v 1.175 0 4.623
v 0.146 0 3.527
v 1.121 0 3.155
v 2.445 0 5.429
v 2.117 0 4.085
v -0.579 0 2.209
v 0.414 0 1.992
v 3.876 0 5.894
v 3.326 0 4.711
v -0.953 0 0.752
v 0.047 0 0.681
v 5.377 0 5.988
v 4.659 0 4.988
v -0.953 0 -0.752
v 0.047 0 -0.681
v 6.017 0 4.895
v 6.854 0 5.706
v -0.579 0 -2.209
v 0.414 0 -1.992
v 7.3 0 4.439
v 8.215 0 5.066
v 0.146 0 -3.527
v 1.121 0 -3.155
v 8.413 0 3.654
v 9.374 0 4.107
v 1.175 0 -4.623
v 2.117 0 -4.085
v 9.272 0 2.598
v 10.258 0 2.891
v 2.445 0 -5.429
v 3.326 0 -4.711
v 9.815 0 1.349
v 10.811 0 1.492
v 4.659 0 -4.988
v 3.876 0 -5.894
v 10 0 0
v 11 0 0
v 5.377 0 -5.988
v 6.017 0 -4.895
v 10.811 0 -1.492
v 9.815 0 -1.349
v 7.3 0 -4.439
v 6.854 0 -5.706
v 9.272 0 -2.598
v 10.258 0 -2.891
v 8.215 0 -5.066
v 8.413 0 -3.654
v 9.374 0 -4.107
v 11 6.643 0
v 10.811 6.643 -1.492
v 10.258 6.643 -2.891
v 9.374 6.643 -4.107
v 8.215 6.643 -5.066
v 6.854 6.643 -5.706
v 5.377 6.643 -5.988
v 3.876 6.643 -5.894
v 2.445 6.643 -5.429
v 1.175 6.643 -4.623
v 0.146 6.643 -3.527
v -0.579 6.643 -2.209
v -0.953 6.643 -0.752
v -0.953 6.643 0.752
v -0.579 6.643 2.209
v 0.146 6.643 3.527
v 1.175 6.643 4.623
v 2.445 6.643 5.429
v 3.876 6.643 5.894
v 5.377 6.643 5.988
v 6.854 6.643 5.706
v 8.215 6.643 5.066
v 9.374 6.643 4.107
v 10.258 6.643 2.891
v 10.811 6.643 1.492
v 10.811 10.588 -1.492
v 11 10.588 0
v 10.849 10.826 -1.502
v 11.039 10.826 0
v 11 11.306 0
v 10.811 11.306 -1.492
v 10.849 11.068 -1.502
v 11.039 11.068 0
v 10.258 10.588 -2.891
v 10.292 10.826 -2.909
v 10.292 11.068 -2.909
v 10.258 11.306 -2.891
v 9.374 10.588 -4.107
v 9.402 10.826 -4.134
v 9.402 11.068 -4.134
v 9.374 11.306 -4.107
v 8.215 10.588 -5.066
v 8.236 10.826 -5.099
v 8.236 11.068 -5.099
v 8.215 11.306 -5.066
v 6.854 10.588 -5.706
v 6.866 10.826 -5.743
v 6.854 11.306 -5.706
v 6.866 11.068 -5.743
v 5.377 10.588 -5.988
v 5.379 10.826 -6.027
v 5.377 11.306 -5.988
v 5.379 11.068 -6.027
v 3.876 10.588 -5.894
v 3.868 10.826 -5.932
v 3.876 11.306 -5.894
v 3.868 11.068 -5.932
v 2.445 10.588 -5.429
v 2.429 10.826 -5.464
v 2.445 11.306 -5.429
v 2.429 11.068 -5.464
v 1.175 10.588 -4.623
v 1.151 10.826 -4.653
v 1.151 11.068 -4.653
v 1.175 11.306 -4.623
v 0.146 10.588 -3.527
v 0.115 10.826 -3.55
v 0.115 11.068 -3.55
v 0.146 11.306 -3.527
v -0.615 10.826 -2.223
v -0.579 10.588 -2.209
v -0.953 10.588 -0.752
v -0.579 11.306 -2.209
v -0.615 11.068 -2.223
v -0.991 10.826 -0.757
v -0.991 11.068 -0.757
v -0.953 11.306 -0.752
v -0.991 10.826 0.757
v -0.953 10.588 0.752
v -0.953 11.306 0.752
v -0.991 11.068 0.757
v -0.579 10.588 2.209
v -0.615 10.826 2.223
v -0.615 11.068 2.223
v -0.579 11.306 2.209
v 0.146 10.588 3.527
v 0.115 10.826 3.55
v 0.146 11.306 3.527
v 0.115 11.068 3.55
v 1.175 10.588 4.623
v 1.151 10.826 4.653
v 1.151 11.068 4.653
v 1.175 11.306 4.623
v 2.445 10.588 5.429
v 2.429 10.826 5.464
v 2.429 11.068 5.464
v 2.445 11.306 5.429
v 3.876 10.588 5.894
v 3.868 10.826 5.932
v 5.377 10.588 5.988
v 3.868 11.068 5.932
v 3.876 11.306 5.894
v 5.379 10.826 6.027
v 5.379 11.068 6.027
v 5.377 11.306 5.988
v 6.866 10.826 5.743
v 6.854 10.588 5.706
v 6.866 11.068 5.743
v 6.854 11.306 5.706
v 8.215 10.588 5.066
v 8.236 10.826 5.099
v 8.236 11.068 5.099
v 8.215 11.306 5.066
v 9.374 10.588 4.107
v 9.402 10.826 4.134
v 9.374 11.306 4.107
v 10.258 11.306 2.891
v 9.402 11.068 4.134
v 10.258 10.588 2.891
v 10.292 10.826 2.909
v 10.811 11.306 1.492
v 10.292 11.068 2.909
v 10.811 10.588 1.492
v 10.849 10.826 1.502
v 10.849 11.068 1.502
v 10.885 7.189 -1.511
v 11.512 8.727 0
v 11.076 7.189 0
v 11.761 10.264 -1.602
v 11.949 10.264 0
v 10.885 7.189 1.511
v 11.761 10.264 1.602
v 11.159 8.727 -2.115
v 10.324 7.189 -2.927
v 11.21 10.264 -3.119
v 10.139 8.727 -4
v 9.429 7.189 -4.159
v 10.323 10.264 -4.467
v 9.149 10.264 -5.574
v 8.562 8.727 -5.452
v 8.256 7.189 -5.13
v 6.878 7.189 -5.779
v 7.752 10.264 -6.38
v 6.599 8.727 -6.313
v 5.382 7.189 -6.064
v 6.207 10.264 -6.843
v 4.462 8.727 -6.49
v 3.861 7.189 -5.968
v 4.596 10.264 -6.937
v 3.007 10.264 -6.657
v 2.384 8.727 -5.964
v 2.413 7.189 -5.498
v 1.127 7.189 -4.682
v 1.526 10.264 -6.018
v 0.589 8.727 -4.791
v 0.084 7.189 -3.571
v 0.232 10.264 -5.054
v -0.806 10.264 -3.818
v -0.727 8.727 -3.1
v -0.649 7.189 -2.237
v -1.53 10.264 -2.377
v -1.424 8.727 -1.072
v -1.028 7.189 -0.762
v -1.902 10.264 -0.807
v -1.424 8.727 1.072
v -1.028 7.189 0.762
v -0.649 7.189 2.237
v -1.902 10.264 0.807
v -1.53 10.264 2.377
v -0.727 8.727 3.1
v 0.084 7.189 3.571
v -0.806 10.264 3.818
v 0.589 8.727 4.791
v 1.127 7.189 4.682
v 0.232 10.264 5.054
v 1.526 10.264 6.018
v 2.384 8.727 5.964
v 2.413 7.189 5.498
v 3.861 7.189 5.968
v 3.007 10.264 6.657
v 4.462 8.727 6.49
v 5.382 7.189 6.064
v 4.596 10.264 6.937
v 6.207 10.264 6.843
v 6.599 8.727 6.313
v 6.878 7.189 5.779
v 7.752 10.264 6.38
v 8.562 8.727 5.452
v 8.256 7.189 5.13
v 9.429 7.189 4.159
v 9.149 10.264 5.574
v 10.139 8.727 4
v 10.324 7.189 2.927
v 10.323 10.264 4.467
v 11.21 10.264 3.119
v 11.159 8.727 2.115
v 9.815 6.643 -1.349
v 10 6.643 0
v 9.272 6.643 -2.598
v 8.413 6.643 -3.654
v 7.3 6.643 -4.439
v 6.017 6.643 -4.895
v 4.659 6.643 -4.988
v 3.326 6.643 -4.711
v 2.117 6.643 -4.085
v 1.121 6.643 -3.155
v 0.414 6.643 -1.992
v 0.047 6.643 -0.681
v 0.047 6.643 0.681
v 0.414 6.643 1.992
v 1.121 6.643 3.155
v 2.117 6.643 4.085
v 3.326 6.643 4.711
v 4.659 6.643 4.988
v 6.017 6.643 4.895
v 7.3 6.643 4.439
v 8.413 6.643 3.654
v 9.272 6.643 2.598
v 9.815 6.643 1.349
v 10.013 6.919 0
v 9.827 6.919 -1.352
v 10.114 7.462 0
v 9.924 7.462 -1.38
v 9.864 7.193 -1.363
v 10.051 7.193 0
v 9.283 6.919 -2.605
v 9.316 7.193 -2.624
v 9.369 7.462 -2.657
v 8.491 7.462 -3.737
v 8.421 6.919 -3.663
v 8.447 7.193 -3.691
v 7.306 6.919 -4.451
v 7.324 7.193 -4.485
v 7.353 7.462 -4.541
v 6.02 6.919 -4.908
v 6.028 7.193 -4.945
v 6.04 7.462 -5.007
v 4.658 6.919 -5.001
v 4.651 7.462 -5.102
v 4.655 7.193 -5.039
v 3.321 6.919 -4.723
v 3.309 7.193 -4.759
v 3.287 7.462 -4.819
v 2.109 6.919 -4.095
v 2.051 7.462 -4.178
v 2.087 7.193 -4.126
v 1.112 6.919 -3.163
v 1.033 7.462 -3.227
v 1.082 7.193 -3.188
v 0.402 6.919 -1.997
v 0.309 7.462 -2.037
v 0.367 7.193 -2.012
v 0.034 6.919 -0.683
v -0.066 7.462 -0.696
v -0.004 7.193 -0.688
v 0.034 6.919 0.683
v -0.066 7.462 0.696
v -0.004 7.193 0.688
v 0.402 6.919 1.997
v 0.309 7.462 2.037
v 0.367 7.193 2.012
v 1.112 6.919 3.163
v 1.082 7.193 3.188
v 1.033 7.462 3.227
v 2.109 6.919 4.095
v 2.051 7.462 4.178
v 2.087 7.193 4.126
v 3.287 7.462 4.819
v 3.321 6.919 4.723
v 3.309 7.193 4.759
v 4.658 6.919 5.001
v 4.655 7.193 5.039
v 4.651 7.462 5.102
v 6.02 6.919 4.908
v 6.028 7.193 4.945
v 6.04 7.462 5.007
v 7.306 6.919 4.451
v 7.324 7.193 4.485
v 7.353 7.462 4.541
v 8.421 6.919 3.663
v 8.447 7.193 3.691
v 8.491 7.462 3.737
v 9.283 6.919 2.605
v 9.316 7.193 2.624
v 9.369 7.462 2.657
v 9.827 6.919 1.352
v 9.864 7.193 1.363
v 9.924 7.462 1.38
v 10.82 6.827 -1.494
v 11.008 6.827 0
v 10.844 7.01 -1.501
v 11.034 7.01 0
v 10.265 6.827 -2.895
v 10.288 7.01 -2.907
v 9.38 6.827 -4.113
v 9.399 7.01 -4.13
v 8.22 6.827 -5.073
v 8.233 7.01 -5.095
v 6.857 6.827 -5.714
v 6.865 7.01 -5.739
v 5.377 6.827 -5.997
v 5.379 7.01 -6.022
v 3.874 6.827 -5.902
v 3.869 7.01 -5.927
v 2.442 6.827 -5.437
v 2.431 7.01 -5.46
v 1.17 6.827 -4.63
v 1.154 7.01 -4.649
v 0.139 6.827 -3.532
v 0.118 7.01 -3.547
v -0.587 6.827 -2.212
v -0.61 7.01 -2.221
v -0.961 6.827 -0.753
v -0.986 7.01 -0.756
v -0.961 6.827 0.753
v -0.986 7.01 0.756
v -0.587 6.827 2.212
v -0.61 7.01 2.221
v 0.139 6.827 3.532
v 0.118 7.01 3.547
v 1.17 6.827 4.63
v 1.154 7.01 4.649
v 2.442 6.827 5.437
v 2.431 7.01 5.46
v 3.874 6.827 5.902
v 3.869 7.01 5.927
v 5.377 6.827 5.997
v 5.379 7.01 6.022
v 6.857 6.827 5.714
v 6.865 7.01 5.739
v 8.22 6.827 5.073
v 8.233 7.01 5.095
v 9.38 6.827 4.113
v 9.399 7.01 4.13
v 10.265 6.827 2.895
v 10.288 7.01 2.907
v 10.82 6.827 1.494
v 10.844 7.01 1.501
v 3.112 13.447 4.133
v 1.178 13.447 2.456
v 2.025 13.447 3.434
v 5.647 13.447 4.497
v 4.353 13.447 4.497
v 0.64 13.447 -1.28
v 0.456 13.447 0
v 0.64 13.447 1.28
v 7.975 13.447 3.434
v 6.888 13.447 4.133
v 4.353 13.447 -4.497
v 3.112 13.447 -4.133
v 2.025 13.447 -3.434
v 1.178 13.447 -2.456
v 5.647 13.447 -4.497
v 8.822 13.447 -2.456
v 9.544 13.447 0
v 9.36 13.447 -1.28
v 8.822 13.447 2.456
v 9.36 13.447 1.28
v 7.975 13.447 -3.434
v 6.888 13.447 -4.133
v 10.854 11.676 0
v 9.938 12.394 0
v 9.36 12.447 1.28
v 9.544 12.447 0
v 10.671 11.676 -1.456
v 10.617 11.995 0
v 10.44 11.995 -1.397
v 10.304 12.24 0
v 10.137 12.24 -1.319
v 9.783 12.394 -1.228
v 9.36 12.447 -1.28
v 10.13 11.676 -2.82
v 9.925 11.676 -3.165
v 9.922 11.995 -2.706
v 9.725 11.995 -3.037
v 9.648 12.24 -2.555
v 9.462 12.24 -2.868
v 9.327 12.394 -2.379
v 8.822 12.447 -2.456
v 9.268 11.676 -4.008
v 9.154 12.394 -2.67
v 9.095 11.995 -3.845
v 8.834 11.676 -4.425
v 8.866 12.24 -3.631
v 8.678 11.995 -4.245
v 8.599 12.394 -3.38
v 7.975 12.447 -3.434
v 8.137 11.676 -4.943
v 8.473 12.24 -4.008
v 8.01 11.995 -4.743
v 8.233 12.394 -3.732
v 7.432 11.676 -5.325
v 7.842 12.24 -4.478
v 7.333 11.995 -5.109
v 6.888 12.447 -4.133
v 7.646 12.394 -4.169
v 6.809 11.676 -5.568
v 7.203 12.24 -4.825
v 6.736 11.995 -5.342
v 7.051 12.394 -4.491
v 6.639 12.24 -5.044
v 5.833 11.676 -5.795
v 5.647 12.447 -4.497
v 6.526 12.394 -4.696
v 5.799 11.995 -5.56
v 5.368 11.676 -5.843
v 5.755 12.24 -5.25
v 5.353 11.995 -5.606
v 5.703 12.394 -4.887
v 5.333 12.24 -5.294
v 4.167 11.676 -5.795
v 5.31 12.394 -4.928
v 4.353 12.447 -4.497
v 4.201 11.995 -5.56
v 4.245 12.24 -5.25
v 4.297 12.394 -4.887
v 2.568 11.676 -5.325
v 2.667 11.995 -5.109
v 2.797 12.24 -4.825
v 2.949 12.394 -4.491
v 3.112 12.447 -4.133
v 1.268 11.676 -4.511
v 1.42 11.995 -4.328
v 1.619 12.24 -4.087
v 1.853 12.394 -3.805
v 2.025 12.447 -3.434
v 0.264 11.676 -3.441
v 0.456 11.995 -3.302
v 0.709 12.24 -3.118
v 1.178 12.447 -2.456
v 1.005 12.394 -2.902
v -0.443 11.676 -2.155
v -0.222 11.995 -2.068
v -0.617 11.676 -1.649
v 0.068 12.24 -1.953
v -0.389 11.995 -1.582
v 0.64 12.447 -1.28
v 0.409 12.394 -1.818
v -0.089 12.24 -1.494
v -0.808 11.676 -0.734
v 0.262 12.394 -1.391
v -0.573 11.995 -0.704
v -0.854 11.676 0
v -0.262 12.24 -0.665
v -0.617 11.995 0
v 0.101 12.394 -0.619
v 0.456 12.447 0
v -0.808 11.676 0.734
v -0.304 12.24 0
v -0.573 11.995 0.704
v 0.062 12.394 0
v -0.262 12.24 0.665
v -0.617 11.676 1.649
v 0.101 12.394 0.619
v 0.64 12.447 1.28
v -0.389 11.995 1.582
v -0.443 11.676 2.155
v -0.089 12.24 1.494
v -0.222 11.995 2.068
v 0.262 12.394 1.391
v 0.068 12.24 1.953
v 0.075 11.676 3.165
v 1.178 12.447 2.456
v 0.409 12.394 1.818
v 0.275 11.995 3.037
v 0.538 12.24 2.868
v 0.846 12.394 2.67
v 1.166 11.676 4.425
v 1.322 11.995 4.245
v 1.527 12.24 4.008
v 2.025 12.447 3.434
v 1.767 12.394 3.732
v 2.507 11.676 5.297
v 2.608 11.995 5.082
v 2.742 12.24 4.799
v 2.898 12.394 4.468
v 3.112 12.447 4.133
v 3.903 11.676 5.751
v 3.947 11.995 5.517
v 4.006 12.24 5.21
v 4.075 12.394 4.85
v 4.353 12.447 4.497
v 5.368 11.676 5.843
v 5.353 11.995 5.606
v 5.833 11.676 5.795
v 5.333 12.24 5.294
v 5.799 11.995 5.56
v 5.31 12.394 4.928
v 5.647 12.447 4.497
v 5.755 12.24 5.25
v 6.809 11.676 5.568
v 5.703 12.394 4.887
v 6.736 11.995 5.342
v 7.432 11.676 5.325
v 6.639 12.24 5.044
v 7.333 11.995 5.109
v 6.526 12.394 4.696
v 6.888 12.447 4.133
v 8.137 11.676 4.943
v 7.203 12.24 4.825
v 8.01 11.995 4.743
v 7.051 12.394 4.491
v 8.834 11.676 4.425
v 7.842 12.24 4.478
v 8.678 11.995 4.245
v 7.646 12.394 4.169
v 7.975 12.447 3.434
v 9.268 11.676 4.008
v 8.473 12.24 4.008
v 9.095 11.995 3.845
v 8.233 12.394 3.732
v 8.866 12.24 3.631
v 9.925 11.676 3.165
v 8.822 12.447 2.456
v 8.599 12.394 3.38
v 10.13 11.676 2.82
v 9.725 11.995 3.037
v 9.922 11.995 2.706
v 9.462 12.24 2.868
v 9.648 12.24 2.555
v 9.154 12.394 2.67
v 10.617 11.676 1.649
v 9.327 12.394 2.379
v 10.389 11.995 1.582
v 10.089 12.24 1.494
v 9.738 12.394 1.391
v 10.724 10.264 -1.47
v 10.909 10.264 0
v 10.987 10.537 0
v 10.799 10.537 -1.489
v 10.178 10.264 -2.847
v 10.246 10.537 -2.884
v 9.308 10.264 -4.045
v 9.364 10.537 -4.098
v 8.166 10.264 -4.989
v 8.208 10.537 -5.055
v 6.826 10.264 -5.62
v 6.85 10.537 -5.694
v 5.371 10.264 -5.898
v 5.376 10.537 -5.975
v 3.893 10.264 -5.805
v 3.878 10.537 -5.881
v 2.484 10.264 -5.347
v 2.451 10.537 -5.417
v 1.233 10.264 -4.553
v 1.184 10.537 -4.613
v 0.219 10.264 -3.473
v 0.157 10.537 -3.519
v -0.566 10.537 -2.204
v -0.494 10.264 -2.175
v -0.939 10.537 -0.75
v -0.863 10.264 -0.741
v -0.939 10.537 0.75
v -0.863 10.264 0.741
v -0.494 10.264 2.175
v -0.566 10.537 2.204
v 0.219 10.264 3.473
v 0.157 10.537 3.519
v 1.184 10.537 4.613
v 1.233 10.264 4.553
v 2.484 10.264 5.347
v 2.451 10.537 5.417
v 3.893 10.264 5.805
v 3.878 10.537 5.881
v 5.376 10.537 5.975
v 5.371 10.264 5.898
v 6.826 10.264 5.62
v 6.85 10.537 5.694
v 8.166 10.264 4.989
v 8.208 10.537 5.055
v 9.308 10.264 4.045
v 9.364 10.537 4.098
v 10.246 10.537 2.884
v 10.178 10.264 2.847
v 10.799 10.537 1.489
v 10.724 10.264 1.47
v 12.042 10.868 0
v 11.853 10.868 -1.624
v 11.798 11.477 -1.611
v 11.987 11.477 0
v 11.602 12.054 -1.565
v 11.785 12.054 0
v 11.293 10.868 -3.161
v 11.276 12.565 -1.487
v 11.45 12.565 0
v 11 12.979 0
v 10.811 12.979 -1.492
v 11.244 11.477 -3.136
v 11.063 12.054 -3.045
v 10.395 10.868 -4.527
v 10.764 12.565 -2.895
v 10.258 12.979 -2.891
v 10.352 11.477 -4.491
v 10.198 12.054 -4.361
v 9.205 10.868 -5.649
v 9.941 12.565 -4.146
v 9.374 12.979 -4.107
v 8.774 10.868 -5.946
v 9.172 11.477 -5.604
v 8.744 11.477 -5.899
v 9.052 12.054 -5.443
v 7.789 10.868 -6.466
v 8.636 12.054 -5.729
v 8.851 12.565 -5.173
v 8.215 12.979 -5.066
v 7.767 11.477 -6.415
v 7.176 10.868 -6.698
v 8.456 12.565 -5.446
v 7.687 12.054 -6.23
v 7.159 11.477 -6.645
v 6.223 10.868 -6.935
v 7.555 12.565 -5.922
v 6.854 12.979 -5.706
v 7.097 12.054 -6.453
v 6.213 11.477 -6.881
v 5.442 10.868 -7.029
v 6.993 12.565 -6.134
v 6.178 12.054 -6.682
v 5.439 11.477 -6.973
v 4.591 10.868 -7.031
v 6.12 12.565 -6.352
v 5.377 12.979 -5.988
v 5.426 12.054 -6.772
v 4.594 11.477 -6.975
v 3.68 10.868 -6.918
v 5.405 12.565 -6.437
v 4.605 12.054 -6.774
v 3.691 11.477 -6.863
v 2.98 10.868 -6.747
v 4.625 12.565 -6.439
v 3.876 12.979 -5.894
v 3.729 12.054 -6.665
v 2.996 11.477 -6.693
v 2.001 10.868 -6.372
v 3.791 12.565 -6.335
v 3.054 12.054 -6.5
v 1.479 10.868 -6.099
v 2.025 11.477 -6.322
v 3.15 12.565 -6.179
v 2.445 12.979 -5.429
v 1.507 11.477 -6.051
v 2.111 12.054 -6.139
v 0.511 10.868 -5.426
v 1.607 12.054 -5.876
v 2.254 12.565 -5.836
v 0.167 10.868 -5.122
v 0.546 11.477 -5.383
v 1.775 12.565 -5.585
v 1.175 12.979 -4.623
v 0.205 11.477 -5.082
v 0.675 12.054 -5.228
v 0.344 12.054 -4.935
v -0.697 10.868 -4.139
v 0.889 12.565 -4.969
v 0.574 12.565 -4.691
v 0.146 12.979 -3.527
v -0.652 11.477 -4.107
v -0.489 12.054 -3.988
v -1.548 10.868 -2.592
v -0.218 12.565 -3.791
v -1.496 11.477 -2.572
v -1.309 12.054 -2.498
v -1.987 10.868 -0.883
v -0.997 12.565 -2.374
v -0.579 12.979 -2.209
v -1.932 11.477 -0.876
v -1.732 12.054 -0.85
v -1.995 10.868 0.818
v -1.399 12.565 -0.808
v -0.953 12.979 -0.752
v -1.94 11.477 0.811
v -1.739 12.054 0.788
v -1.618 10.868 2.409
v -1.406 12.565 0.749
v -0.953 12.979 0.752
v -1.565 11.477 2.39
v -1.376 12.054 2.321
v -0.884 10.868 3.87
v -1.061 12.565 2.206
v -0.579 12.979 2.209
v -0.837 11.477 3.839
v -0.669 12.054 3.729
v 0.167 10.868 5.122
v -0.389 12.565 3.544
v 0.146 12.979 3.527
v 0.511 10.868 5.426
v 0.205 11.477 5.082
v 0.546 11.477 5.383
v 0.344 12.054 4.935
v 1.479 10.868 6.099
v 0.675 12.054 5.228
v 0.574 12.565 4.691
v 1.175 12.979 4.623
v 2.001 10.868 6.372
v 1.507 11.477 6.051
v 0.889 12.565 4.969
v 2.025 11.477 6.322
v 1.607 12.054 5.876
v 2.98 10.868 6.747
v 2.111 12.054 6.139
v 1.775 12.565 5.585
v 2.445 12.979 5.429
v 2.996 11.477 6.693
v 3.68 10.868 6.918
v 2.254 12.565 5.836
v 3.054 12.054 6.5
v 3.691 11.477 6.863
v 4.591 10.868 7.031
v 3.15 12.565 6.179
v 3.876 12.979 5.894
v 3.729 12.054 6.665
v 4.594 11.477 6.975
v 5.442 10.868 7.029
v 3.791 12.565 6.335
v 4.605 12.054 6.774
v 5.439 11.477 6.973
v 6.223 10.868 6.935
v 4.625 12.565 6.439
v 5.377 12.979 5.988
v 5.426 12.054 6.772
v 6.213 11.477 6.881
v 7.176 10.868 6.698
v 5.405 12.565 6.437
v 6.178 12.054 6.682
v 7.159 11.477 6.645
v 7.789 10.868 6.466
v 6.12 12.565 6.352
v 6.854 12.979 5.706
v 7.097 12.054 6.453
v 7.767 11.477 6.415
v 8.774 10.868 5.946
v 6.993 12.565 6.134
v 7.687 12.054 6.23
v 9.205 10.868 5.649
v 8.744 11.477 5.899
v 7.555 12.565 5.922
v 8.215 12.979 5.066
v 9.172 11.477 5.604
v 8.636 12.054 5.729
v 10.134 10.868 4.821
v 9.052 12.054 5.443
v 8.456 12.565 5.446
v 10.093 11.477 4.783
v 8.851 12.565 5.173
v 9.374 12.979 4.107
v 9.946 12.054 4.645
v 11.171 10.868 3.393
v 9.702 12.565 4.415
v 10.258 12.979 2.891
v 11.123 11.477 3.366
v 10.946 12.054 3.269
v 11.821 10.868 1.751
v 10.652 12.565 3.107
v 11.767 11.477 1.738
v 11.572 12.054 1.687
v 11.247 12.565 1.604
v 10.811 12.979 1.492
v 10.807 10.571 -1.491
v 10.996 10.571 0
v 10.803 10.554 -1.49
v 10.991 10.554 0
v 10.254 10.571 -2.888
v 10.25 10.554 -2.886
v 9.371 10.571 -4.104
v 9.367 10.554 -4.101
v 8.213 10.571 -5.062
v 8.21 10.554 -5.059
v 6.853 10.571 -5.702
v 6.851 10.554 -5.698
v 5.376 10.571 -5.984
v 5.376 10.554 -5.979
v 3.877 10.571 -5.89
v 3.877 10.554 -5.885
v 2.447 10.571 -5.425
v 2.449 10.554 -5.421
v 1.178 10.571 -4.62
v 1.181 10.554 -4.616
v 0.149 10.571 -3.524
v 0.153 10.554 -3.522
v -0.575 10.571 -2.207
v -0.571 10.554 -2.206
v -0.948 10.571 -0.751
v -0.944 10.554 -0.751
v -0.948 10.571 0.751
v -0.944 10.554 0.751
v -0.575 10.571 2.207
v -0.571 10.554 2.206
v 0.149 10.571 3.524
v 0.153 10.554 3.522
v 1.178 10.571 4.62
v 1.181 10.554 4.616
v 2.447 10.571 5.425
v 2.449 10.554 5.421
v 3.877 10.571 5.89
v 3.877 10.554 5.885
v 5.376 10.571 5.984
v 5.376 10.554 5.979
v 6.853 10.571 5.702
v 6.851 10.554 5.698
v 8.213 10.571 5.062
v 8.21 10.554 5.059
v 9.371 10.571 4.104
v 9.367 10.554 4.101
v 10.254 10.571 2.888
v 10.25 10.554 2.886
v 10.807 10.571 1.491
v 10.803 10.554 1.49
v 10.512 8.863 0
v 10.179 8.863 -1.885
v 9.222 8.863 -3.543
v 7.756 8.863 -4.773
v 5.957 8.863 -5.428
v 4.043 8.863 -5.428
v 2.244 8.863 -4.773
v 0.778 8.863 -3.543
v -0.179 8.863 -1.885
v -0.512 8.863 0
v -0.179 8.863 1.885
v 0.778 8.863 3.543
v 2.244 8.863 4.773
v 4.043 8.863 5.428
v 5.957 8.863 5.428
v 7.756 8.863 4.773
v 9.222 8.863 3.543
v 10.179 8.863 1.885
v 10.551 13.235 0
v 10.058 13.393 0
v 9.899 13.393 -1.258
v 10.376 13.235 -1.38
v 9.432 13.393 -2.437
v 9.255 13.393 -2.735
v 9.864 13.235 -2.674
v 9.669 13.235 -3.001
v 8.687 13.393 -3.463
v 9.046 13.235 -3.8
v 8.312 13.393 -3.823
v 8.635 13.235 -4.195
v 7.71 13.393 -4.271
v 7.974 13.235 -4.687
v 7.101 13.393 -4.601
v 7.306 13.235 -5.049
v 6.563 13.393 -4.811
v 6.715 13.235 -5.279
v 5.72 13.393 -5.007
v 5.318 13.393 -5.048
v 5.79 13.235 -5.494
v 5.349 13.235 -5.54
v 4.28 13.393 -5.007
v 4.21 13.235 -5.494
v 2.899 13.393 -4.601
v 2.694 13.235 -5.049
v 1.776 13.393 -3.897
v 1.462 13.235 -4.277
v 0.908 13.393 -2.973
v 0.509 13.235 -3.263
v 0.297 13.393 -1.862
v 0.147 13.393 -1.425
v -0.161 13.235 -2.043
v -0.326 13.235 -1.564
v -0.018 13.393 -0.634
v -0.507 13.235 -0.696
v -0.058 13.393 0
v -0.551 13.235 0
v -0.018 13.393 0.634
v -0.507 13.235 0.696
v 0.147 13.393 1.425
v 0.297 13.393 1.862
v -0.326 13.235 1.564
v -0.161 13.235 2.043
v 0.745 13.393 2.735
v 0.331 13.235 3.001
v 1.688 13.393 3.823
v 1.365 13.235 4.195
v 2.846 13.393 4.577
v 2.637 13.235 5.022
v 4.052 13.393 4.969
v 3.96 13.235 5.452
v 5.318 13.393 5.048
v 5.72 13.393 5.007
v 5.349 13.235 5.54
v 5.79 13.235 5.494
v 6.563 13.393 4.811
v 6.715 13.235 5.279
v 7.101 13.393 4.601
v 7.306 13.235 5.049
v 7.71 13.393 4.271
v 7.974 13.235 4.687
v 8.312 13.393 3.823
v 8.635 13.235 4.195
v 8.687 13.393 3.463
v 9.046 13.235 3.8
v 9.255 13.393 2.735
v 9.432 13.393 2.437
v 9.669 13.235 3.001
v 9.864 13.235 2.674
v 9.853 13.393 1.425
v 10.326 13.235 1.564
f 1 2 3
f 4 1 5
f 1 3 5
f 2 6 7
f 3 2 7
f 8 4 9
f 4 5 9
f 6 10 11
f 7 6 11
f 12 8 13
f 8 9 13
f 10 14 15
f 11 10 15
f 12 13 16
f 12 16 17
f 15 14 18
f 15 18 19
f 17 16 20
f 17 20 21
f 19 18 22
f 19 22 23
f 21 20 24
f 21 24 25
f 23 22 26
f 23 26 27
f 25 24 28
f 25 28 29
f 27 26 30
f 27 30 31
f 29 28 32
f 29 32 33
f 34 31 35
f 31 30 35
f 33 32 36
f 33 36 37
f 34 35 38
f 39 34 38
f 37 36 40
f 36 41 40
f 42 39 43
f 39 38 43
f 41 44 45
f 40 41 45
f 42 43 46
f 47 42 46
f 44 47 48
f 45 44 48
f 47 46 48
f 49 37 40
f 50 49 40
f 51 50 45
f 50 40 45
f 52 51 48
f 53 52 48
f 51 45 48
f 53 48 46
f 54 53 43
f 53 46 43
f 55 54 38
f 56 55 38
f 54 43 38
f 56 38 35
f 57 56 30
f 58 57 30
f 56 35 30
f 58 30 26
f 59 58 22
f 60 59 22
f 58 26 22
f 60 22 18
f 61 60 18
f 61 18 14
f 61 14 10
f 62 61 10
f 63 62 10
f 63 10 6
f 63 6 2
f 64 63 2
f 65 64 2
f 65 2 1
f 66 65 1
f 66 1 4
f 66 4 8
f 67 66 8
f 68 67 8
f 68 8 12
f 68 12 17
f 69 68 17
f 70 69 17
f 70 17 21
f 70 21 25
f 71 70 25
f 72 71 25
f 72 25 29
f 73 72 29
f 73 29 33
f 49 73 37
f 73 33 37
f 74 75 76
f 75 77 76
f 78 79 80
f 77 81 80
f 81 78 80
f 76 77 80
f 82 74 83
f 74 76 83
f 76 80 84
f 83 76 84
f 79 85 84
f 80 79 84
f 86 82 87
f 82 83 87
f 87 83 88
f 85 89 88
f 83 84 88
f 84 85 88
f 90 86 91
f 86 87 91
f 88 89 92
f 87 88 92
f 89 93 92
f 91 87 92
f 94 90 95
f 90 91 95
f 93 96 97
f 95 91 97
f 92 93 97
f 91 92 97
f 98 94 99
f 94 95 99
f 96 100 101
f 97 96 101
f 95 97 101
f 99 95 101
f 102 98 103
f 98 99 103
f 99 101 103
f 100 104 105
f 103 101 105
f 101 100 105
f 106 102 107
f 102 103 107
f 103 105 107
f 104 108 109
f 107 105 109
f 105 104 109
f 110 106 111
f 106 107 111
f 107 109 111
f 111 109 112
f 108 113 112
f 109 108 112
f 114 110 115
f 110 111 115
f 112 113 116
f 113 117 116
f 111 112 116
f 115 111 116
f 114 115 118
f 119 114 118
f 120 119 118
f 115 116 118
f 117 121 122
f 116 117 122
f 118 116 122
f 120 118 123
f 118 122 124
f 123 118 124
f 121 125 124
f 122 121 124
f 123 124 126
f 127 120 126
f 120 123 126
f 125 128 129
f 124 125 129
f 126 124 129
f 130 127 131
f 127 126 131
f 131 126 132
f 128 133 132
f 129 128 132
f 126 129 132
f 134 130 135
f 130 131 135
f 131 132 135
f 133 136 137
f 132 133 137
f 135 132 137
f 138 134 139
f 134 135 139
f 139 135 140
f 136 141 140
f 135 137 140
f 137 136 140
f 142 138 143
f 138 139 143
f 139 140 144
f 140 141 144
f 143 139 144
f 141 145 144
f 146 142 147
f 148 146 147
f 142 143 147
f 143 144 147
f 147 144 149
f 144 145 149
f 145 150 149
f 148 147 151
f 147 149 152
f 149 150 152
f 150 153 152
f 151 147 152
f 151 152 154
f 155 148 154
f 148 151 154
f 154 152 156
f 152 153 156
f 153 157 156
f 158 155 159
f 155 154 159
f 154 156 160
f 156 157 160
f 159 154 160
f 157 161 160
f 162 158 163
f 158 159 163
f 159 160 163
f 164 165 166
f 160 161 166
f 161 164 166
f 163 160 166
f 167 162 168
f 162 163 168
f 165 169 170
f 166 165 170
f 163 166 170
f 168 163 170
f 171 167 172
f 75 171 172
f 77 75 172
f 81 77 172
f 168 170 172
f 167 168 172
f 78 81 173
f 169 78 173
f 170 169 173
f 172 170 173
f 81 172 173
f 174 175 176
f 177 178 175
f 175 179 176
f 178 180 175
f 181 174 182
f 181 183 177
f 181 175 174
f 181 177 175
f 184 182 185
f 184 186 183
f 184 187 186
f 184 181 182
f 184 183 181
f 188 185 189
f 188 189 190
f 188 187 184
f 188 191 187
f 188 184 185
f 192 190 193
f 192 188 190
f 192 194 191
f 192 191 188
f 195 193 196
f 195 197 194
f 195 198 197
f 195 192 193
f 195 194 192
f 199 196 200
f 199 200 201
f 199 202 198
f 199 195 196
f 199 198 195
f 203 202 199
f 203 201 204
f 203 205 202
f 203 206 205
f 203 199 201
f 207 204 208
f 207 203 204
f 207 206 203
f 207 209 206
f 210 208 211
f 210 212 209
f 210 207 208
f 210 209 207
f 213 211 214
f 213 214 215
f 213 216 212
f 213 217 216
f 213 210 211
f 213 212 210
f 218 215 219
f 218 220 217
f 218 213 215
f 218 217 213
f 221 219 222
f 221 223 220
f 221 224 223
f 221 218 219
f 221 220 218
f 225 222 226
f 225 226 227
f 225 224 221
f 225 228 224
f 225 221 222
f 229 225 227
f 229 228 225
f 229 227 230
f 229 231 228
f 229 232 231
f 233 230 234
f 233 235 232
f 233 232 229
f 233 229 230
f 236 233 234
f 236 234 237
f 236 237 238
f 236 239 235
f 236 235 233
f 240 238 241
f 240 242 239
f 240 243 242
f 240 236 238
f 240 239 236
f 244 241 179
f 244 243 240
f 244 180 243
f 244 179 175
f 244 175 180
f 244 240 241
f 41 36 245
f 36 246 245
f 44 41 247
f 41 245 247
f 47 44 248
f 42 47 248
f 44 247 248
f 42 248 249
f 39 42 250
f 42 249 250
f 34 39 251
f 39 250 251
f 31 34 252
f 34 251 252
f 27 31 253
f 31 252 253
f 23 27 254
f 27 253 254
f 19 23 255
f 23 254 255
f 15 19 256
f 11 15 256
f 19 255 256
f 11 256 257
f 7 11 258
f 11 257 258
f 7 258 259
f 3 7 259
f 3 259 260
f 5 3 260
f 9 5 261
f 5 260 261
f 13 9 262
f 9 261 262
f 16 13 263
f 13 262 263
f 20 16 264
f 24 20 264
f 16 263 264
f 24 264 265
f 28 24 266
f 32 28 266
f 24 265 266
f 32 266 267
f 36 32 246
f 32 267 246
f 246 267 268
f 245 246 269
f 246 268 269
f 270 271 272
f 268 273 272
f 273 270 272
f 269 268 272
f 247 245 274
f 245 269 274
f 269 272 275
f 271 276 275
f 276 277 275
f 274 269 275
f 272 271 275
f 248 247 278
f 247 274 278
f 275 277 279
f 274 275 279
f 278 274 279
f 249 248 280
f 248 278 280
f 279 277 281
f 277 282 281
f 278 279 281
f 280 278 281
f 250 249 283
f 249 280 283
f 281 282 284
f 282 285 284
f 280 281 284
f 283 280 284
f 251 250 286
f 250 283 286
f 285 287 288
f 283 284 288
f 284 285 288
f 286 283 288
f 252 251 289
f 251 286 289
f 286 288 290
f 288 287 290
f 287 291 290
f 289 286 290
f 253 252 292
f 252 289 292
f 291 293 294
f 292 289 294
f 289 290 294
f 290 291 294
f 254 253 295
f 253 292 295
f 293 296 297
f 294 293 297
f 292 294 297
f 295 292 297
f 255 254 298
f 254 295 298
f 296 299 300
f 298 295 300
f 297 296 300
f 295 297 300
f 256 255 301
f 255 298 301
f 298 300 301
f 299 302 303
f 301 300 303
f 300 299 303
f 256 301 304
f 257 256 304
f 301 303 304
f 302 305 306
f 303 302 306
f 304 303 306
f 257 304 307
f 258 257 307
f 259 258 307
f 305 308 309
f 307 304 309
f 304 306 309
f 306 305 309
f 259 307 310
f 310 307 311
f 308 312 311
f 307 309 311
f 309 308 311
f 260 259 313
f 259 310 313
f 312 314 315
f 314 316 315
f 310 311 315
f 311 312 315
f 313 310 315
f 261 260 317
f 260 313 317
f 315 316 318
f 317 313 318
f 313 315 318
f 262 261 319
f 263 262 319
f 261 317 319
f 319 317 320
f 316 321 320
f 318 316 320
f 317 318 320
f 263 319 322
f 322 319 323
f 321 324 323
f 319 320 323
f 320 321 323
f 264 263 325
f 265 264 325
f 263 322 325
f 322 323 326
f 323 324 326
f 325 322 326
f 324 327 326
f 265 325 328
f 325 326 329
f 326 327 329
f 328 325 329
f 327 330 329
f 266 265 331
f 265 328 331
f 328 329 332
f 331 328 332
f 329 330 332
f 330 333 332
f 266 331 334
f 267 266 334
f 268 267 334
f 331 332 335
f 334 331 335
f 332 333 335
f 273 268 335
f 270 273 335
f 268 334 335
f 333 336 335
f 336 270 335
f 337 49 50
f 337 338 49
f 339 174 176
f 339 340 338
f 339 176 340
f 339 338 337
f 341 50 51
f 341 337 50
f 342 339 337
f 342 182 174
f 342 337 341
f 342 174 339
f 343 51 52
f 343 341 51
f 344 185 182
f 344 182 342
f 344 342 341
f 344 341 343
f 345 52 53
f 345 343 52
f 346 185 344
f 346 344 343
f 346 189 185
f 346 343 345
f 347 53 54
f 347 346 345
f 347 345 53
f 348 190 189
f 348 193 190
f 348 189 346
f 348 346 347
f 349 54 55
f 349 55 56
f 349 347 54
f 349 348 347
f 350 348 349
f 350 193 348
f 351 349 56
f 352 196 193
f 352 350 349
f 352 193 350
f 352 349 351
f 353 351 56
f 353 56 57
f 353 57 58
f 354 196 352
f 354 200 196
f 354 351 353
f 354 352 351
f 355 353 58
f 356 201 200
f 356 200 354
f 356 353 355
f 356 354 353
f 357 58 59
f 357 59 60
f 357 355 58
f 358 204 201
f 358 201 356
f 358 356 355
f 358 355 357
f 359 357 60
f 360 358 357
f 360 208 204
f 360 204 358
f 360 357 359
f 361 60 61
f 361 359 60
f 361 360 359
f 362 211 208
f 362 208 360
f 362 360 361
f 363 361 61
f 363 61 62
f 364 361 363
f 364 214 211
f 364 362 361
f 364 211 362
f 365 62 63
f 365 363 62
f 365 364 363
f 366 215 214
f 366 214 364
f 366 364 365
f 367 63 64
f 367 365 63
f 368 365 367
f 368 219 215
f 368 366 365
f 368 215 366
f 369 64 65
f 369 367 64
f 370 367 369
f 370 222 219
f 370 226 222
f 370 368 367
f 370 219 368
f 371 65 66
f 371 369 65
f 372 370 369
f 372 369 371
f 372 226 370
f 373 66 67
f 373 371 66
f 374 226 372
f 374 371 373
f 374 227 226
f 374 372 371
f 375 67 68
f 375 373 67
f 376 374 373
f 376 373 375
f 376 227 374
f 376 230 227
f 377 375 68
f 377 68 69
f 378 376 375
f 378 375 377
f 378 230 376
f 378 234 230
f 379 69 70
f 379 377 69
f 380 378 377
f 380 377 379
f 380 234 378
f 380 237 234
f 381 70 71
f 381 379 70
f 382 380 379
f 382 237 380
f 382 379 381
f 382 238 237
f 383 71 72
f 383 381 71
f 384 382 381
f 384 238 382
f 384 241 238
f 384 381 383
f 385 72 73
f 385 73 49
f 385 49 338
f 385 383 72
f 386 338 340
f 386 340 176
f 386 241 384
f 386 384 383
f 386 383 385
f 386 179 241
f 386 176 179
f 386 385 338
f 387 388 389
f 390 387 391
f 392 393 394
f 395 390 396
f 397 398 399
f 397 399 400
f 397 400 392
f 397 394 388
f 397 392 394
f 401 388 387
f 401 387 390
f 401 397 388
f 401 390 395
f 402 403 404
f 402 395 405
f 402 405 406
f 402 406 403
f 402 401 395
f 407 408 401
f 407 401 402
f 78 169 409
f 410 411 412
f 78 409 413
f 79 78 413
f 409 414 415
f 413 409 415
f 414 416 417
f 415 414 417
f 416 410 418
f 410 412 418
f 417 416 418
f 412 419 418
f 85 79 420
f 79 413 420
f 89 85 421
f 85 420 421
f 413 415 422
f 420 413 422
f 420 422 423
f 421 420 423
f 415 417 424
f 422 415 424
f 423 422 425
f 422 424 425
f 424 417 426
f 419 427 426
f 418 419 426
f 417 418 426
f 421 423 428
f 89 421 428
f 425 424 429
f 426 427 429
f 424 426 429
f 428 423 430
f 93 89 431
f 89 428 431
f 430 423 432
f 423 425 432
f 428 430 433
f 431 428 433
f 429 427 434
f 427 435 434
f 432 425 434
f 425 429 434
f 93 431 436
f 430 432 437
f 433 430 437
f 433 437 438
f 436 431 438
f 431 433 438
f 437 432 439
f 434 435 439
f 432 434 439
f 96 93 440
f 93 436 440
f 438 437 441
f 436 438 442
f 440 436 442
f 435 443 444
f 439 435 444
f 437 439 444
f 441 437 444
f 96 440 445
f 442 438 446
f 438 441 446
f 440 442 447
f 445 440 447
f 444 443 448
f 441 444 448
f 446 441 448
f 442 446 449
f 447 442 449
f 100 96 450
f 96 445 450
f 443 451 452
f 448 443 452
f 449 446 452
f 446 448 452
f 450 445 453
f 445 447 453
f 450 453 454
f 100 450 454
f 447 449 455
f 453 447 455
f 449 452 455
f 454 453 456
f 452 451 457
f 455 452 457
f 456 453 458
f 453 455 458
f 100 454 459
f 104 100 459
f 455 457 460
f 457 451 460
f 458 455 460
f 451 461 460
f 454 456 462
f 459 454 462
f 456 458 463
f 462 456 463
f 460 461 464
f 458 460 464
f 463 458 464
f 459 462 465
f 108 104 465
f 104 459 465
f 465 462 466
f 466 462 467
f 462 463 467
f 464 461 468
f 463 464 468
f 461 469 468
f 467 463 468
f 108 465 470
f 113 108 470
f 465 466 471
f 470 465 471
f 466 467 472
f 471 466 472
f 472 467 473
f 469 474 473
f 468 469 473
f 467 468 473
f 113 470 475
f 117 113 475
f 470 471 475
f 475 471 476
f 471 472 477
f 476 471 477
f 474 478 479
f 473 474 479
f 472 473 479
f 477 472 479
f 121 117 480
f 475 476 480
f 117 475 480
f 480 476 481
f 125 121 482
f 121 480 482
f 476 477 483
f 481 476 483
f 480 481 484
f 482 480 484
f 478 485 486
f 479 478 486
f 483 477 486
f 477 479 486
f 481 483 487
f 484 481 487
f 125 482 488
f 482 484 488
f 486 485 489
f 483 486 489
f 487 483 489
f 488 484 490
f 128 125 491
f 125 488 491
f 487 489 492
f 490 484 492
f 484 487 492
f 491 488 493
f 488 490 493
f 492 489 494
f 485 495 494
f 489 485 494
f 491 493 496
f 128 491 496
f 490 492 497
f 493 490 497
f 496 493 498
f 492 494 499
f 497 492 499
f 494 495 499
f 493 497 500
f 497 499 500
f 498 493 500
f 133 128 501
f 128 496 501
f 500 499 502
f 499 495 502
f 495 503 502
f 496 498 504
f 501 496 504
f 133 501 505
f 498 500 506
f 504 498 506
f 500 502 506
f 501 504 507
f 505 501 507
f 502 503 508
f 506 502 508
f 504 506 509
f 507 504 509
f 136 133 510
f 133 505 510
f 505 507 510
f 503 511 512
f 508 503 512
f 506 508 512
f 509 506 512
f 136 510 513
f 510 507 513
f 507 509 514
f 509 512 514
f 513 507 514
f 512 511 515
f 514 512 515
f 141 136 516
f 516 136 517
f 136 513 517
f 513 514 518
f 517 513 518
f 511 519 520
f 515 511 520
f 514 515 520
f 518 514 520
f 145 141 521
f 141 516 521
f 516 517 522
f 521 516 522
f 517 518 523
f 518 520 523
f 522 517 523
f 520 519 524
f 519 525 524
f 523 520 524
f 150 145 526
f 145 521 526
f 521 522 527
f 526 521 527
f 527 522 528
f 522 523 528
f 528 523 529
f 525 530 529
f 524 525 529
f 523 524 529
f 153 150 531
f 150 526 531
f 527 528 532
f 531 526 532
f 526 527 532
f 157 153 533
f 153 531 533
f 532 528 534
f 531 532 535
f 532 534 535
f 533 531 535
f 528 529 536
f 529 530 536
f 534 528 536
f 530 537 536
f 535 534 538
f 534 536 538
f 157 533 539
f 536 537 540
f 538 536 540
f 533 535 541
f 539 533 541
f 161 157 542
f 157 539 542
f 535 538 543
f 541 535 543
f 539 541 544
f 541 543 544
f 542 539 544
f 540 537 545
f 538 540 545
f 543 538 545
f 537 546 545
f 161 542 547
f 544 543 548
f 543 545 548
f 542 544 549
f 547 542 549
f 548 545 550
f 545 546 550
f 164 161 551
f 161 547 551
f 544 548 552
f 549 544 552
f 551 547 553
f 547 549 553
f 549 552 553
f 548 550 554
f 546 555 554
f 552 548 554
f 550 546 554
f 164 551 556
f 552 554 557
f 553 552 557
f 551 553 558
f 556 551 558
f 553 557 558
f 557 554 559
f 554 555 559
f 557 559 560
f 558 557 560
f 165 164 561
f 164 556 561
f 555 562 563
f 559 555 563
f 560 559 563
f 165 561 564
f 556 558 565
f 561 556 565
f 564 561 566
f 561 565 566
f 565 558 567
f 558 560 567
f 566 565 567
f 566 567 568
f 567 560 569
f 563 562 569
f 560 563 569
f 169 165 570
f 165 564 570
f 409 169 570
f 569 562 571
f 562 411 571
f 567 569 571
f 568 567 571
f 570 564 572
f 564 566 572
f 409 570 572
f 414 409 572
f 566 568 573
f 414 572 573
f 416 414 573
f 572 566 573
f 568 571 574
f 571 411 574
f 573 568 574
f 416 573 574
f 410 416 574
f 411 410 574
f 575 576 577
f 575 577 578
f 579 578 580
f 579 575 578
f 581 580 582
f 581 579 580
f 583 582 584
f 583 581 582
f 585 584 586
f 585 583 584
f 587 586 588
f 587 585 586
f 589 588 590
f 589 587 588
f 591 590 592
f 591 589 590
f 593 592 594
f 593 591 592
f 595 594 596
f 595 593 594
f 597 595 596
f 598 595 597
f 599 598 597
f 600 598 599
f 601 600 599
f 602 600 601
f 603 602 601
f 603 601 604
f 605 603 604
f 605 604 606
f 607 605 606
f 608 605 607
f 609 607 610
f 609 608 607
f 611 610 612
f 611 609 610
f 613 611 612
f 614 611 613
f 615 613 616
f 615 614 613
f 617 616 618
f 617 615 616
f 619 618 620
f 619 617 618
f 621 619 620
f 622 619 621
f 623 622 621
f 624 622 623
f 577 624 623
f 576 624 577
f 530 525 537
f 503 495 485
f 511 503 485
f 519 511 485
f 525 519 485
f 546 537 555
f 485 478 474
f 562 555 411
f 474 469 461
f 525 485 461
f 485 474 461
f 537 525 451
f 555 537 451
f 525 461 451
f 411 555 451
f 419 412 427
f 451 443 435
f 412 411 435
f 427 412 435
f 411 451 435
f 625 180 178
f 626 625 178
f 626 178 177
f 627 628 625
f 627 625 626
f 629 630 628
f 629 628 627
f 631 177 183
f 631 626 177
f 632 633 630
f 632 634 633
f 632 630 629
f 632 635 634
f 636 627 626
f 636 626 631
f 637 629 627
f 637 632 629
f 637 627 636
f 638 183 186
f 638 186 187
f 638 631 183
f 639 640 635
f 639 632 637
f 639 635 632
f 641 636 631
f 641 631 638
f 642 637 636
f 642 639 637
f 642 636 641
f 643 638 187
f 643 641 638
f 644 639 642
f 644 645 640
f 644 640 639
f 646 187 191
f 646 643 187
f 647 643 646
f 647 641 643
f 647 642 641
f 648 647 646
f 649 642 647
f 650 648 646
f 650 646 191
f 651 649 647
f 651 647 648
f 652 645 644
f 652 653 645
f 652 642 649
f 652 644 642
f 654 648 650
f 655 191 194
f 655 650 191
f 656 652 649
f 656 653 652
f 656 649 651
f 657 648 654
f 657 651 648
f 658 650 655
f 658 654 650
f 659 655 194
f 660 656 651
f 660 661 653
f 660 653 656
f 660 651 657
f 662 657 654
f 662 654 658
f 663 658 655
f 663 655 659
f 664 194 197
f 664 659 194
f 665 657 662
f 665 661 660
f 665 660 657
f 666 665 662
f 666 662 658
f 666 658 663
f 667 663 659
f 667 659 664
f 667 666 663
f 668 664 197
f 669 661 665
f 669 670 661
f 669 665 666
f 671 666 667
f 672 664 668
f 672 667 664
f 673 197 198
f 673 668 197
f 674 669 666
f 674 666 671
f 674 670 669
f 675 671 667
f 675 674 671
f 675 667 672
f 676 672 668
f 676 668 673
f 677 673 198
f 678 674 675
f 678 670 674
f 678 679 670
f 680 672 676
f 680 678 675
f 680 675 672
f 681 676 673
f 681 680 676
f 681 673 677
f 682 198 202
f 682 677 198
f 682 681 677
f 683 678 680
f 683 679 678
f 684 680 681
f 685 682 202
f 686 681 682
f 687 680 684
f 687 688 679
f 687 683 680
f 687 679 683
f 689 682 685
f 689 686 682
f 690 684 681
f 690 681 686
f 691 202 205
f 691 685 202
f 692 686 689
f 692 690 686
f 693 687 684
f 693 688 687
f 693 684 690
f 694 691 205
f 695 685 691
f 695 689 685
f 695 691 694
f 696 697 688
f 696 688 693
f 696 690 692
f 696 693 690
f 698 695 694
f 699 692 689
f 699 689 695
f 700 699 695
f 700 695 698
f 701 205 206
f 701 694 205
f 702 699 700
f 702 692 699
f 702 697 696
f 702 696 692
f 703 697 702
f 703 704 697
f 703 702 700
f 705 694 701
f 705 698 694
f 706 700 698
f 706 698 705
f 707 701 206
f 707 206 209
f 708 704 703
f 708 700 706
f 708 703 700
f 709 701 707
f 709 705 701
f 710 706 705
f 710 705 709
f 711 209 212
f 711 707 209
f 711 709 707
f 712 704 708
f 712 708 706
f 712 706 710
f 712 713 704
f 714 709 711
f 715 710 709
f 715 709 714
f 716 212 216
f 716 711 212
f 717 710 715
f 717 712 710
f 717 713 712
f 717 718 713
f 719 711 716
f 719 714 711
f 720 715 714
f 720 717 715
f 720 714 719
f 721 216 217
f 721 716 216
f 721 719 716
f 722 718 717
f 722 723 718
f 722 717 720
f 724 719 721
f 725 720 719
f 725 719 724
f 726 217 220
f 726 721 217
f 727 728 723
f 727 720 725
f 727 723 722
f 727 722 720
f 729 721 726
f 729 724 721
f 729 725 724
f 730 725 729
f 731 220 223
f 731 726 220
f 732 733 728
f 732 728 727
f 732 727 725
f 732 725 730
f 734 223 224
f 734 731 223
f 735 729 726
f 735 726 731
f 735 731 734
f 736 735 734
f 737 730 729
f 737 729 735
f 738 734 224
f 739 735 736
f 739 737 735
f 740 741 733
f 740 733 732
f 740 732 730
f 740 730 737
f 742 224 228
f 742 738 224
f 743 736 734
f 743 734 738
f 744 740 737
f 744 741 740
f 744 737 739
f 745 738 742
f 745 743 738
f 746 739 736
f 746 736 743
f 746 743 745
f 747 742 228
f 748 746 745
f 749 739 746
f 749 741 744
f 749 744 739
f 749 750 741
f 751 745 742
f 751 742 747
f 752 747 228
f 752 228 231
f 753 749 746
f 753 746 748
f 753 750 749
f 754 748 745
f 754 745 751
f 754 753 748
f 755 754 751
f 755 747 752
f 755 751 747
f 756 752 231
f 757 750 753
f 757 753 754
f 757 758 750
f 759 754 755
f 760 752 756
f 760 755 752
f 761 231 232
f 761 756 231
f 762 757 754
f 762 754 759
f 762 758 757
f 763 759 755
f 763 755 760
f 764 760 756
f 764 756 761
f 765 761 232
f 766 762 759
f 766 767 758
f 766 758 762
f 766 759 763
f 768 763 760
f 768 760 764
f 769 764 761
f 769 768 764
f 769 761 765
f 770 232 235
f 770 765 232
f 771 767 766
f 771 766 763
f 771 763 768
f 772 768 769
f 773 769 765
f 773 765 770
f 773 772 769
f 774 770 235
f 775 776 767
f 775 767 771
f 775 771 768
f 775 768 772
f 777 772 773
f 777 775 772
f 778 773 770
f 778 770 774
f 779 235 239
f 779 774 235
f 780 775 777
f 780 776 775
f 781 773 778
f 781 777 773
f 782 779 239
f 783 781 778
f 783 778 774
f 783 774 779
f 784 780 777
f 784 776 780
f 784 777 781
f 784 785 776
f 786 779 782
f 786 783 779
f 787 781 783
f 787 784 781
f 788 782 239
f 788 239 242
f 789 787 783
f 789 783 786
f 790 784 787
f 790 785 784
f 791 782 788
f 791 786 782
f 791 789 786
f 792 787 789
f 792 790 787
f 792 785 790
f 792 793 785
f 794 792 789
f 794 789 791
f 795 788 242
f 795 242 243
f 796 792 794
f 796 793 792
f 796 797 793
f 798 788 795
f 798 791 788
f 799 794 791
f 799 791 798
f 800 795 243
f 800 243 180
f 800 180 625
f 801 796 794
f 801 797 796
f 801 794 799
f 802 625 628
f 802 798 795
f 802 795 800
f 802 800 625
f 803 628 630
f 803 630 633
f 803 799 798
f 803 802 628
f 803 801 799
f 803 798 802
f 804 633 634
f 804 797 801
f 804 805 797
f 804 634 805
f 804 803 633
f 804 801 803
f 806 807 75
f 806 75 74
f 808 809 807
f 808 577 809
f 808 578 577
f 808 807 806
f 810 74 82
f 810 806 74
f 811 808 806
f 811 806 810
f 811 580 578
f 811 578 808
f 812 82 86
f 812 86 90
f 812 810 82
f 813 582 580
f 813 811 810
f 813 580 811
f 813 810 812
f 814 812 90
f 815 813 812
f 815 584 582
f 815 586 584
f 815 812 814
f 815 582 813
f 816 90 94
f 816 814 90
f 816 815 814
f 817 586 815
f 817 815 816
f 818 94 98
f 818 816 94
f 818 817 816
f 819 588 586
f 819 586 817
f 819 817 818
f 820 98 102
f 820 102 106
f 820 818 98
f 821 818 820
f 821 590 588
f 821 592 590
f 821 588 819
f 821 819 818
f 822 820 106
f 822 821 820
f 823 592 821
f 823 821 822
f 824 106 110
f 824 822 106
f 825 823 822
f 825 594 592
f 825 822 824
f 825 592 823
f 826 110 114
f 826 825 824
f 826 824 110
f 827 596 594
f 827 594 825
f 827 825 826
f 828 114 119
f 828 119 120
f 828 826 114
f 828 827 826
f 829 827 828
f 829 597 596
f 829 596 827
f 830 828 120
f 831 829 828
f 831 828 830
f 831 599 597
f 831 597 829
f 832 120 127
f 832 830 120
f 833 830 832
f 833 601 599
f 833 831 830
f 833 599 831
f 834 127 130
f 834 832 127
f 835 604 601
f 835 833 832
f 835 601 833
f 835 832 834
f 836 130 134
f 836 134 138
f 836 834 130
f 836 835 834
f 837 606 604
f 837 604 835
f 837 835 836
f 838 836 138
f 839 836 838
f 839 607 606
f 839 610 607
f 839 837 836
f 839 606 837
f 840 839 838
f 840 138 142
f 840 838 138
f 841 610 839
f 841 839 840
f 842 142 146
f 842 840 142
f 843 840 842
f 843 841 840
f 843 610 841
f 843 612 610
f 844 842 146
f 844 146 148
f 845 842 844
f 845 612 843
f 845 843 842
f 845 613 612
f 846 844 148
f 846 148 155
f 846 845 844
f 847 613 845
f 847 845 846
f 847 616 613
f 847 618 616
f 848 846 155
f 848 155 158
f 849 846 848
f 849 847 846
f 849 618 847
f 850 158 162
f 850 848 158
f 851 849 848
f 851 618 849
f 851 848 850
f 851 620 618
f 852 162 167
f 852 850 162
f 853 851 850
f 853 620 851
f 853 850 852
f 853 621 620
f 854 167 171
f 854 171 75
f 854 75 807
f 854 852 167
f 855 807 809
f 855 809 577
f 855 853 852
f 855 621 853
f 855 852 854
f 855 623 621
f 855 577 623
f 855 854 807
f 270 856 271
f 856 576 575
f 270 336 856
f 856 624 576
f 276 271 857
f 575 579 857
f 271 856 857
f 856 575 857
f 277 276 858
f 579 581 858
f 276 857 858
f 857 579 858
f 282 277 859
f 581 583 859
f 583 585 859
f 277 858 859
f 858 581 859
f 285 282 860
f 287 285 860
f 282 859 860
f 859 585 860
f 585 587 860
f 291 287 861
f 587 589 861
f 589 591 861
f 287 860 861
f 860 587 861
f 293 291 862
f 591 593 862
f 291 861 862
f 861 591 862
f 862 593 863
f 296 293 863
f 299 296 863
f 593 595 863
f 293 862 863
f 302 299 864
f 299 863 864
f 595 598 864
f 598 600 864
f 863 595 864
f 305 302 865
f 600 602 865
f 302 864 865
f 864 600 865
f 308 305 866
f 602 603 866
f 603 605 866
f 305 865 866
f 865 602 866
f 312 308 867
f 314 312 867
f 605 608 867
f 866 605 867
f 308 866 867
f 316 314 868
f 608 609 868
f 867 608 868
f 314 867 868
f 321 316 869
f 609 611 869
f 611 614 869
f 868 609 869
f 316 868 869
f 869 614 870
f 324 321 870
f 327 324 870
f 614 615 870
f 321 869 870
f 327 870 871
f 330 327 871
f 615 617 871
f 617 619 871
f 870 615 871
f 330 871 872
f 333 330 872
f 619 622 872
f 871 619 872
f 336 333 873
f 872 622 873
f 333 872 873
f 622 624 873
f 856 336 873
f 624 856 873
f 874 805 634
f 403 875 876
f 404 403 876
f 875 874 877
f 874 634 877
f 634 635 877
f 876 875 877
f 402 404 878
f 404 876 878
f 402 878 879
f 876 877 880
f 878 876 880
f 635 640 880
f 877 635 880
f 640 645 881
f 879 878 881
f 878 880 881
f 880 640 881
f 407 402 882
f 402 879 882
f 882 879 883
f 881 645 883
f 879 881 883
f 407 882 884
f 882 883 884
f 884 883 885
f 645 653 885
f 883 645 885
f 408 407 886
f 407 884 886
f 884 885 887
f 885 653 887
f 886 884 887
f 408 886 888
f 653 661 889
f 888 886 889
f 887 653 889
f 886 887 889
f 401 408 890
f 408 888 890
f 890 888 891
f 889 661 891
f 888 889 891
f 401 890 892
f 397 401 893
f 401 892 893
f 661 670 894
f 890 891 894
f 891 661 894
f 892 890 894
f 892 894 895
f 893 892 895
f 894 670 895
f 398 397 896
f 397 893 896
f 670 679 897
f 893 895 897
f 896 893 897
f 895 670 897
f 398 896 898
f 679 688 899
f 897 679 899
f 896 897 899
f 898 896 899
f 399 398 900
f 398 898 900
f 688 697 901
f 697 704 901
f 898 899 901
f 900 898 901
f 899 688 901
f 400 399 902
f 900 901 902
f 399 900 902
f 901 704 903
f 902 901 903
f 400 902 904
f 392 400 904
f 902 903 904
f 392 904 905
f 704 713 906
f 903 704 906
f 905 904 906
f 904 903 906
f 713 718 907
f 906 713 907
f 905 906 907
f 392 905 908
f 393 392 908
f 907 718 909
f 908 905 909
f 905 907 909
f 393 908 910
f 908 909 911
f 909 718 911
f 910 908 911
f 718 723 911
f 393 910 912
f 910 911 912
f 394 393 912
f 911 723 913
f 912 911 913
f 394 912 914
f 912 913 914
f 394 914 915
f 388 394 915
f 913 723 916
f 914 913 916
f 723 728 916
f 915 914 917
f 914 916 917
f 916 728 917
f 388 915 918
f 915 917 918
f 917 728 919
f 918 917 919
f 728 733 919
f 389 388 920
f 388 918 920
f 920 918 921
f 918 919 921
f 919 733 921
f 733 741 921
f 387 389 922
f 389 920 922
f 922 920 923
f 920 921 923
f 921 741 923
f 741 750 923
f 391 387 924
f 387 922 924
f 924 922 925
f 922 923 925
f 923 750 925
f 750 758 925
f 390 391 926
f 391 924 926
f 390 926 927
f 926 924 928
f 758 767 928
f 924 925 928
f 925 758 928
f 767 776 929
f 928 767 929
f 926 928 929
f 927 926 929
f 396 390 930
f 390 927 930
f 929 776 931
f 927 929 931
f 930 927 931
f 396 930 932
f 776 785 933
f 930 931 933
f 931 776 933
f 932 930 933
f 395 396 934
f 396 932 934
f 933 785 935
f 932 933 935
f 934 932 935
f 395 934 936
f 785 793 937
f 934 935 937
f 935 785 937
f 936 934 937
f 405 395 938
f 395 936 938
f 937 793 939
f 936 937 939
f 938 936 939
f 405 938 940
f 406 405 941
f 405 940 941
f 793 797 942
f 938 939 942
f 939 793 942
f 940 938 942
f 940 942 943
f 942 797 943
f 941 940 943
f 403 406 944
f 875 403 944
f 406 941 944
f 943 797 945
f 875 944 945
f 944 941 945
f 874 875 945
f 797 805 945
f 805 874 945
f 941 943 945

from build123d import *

# Parameters (mm, degrees)
CONG_1_R = 1.5
CONG_2_R = 3
COQUE1_T = 1


with BuildPart() as part:
    # Esquisse1 → Révolution1 (revolve)
    with BuildSketch(Plane.XY):
        Polygon((10, 0), (10, 7.060491131), (11.528559936, 12.44684519), (5, 12.44684519), (5, 0), align=None)
    revolve(axis=Axis((5, 0, 0), (0, 1, 0)))

    # Congé1
    cong_1_edges = [part.edges().sort_by_distance(p)[0] for p in [
        (-1.528559936, 12.44684519, 0),
    ]]
    fillet(cong_1_edges, radius=CONG_1_R)

    # Congé2
    cong_2_edges = [part.edges().sort_by_distance(p)[0] for p in [
        (0, 7.060491131, 0),
    ]]
    fillet(cong_2_edges, radius=CONG_2_R)

    # Coque1
    coque1_openings = [part.faces().sort_by_distance(p)[0] for p in [
        (5, 0, 0),
    ]]
    offset(amount=COQUE1_T, openings=coque1_openings, kind=Kind.INTERSECTION)


solid = part.part
